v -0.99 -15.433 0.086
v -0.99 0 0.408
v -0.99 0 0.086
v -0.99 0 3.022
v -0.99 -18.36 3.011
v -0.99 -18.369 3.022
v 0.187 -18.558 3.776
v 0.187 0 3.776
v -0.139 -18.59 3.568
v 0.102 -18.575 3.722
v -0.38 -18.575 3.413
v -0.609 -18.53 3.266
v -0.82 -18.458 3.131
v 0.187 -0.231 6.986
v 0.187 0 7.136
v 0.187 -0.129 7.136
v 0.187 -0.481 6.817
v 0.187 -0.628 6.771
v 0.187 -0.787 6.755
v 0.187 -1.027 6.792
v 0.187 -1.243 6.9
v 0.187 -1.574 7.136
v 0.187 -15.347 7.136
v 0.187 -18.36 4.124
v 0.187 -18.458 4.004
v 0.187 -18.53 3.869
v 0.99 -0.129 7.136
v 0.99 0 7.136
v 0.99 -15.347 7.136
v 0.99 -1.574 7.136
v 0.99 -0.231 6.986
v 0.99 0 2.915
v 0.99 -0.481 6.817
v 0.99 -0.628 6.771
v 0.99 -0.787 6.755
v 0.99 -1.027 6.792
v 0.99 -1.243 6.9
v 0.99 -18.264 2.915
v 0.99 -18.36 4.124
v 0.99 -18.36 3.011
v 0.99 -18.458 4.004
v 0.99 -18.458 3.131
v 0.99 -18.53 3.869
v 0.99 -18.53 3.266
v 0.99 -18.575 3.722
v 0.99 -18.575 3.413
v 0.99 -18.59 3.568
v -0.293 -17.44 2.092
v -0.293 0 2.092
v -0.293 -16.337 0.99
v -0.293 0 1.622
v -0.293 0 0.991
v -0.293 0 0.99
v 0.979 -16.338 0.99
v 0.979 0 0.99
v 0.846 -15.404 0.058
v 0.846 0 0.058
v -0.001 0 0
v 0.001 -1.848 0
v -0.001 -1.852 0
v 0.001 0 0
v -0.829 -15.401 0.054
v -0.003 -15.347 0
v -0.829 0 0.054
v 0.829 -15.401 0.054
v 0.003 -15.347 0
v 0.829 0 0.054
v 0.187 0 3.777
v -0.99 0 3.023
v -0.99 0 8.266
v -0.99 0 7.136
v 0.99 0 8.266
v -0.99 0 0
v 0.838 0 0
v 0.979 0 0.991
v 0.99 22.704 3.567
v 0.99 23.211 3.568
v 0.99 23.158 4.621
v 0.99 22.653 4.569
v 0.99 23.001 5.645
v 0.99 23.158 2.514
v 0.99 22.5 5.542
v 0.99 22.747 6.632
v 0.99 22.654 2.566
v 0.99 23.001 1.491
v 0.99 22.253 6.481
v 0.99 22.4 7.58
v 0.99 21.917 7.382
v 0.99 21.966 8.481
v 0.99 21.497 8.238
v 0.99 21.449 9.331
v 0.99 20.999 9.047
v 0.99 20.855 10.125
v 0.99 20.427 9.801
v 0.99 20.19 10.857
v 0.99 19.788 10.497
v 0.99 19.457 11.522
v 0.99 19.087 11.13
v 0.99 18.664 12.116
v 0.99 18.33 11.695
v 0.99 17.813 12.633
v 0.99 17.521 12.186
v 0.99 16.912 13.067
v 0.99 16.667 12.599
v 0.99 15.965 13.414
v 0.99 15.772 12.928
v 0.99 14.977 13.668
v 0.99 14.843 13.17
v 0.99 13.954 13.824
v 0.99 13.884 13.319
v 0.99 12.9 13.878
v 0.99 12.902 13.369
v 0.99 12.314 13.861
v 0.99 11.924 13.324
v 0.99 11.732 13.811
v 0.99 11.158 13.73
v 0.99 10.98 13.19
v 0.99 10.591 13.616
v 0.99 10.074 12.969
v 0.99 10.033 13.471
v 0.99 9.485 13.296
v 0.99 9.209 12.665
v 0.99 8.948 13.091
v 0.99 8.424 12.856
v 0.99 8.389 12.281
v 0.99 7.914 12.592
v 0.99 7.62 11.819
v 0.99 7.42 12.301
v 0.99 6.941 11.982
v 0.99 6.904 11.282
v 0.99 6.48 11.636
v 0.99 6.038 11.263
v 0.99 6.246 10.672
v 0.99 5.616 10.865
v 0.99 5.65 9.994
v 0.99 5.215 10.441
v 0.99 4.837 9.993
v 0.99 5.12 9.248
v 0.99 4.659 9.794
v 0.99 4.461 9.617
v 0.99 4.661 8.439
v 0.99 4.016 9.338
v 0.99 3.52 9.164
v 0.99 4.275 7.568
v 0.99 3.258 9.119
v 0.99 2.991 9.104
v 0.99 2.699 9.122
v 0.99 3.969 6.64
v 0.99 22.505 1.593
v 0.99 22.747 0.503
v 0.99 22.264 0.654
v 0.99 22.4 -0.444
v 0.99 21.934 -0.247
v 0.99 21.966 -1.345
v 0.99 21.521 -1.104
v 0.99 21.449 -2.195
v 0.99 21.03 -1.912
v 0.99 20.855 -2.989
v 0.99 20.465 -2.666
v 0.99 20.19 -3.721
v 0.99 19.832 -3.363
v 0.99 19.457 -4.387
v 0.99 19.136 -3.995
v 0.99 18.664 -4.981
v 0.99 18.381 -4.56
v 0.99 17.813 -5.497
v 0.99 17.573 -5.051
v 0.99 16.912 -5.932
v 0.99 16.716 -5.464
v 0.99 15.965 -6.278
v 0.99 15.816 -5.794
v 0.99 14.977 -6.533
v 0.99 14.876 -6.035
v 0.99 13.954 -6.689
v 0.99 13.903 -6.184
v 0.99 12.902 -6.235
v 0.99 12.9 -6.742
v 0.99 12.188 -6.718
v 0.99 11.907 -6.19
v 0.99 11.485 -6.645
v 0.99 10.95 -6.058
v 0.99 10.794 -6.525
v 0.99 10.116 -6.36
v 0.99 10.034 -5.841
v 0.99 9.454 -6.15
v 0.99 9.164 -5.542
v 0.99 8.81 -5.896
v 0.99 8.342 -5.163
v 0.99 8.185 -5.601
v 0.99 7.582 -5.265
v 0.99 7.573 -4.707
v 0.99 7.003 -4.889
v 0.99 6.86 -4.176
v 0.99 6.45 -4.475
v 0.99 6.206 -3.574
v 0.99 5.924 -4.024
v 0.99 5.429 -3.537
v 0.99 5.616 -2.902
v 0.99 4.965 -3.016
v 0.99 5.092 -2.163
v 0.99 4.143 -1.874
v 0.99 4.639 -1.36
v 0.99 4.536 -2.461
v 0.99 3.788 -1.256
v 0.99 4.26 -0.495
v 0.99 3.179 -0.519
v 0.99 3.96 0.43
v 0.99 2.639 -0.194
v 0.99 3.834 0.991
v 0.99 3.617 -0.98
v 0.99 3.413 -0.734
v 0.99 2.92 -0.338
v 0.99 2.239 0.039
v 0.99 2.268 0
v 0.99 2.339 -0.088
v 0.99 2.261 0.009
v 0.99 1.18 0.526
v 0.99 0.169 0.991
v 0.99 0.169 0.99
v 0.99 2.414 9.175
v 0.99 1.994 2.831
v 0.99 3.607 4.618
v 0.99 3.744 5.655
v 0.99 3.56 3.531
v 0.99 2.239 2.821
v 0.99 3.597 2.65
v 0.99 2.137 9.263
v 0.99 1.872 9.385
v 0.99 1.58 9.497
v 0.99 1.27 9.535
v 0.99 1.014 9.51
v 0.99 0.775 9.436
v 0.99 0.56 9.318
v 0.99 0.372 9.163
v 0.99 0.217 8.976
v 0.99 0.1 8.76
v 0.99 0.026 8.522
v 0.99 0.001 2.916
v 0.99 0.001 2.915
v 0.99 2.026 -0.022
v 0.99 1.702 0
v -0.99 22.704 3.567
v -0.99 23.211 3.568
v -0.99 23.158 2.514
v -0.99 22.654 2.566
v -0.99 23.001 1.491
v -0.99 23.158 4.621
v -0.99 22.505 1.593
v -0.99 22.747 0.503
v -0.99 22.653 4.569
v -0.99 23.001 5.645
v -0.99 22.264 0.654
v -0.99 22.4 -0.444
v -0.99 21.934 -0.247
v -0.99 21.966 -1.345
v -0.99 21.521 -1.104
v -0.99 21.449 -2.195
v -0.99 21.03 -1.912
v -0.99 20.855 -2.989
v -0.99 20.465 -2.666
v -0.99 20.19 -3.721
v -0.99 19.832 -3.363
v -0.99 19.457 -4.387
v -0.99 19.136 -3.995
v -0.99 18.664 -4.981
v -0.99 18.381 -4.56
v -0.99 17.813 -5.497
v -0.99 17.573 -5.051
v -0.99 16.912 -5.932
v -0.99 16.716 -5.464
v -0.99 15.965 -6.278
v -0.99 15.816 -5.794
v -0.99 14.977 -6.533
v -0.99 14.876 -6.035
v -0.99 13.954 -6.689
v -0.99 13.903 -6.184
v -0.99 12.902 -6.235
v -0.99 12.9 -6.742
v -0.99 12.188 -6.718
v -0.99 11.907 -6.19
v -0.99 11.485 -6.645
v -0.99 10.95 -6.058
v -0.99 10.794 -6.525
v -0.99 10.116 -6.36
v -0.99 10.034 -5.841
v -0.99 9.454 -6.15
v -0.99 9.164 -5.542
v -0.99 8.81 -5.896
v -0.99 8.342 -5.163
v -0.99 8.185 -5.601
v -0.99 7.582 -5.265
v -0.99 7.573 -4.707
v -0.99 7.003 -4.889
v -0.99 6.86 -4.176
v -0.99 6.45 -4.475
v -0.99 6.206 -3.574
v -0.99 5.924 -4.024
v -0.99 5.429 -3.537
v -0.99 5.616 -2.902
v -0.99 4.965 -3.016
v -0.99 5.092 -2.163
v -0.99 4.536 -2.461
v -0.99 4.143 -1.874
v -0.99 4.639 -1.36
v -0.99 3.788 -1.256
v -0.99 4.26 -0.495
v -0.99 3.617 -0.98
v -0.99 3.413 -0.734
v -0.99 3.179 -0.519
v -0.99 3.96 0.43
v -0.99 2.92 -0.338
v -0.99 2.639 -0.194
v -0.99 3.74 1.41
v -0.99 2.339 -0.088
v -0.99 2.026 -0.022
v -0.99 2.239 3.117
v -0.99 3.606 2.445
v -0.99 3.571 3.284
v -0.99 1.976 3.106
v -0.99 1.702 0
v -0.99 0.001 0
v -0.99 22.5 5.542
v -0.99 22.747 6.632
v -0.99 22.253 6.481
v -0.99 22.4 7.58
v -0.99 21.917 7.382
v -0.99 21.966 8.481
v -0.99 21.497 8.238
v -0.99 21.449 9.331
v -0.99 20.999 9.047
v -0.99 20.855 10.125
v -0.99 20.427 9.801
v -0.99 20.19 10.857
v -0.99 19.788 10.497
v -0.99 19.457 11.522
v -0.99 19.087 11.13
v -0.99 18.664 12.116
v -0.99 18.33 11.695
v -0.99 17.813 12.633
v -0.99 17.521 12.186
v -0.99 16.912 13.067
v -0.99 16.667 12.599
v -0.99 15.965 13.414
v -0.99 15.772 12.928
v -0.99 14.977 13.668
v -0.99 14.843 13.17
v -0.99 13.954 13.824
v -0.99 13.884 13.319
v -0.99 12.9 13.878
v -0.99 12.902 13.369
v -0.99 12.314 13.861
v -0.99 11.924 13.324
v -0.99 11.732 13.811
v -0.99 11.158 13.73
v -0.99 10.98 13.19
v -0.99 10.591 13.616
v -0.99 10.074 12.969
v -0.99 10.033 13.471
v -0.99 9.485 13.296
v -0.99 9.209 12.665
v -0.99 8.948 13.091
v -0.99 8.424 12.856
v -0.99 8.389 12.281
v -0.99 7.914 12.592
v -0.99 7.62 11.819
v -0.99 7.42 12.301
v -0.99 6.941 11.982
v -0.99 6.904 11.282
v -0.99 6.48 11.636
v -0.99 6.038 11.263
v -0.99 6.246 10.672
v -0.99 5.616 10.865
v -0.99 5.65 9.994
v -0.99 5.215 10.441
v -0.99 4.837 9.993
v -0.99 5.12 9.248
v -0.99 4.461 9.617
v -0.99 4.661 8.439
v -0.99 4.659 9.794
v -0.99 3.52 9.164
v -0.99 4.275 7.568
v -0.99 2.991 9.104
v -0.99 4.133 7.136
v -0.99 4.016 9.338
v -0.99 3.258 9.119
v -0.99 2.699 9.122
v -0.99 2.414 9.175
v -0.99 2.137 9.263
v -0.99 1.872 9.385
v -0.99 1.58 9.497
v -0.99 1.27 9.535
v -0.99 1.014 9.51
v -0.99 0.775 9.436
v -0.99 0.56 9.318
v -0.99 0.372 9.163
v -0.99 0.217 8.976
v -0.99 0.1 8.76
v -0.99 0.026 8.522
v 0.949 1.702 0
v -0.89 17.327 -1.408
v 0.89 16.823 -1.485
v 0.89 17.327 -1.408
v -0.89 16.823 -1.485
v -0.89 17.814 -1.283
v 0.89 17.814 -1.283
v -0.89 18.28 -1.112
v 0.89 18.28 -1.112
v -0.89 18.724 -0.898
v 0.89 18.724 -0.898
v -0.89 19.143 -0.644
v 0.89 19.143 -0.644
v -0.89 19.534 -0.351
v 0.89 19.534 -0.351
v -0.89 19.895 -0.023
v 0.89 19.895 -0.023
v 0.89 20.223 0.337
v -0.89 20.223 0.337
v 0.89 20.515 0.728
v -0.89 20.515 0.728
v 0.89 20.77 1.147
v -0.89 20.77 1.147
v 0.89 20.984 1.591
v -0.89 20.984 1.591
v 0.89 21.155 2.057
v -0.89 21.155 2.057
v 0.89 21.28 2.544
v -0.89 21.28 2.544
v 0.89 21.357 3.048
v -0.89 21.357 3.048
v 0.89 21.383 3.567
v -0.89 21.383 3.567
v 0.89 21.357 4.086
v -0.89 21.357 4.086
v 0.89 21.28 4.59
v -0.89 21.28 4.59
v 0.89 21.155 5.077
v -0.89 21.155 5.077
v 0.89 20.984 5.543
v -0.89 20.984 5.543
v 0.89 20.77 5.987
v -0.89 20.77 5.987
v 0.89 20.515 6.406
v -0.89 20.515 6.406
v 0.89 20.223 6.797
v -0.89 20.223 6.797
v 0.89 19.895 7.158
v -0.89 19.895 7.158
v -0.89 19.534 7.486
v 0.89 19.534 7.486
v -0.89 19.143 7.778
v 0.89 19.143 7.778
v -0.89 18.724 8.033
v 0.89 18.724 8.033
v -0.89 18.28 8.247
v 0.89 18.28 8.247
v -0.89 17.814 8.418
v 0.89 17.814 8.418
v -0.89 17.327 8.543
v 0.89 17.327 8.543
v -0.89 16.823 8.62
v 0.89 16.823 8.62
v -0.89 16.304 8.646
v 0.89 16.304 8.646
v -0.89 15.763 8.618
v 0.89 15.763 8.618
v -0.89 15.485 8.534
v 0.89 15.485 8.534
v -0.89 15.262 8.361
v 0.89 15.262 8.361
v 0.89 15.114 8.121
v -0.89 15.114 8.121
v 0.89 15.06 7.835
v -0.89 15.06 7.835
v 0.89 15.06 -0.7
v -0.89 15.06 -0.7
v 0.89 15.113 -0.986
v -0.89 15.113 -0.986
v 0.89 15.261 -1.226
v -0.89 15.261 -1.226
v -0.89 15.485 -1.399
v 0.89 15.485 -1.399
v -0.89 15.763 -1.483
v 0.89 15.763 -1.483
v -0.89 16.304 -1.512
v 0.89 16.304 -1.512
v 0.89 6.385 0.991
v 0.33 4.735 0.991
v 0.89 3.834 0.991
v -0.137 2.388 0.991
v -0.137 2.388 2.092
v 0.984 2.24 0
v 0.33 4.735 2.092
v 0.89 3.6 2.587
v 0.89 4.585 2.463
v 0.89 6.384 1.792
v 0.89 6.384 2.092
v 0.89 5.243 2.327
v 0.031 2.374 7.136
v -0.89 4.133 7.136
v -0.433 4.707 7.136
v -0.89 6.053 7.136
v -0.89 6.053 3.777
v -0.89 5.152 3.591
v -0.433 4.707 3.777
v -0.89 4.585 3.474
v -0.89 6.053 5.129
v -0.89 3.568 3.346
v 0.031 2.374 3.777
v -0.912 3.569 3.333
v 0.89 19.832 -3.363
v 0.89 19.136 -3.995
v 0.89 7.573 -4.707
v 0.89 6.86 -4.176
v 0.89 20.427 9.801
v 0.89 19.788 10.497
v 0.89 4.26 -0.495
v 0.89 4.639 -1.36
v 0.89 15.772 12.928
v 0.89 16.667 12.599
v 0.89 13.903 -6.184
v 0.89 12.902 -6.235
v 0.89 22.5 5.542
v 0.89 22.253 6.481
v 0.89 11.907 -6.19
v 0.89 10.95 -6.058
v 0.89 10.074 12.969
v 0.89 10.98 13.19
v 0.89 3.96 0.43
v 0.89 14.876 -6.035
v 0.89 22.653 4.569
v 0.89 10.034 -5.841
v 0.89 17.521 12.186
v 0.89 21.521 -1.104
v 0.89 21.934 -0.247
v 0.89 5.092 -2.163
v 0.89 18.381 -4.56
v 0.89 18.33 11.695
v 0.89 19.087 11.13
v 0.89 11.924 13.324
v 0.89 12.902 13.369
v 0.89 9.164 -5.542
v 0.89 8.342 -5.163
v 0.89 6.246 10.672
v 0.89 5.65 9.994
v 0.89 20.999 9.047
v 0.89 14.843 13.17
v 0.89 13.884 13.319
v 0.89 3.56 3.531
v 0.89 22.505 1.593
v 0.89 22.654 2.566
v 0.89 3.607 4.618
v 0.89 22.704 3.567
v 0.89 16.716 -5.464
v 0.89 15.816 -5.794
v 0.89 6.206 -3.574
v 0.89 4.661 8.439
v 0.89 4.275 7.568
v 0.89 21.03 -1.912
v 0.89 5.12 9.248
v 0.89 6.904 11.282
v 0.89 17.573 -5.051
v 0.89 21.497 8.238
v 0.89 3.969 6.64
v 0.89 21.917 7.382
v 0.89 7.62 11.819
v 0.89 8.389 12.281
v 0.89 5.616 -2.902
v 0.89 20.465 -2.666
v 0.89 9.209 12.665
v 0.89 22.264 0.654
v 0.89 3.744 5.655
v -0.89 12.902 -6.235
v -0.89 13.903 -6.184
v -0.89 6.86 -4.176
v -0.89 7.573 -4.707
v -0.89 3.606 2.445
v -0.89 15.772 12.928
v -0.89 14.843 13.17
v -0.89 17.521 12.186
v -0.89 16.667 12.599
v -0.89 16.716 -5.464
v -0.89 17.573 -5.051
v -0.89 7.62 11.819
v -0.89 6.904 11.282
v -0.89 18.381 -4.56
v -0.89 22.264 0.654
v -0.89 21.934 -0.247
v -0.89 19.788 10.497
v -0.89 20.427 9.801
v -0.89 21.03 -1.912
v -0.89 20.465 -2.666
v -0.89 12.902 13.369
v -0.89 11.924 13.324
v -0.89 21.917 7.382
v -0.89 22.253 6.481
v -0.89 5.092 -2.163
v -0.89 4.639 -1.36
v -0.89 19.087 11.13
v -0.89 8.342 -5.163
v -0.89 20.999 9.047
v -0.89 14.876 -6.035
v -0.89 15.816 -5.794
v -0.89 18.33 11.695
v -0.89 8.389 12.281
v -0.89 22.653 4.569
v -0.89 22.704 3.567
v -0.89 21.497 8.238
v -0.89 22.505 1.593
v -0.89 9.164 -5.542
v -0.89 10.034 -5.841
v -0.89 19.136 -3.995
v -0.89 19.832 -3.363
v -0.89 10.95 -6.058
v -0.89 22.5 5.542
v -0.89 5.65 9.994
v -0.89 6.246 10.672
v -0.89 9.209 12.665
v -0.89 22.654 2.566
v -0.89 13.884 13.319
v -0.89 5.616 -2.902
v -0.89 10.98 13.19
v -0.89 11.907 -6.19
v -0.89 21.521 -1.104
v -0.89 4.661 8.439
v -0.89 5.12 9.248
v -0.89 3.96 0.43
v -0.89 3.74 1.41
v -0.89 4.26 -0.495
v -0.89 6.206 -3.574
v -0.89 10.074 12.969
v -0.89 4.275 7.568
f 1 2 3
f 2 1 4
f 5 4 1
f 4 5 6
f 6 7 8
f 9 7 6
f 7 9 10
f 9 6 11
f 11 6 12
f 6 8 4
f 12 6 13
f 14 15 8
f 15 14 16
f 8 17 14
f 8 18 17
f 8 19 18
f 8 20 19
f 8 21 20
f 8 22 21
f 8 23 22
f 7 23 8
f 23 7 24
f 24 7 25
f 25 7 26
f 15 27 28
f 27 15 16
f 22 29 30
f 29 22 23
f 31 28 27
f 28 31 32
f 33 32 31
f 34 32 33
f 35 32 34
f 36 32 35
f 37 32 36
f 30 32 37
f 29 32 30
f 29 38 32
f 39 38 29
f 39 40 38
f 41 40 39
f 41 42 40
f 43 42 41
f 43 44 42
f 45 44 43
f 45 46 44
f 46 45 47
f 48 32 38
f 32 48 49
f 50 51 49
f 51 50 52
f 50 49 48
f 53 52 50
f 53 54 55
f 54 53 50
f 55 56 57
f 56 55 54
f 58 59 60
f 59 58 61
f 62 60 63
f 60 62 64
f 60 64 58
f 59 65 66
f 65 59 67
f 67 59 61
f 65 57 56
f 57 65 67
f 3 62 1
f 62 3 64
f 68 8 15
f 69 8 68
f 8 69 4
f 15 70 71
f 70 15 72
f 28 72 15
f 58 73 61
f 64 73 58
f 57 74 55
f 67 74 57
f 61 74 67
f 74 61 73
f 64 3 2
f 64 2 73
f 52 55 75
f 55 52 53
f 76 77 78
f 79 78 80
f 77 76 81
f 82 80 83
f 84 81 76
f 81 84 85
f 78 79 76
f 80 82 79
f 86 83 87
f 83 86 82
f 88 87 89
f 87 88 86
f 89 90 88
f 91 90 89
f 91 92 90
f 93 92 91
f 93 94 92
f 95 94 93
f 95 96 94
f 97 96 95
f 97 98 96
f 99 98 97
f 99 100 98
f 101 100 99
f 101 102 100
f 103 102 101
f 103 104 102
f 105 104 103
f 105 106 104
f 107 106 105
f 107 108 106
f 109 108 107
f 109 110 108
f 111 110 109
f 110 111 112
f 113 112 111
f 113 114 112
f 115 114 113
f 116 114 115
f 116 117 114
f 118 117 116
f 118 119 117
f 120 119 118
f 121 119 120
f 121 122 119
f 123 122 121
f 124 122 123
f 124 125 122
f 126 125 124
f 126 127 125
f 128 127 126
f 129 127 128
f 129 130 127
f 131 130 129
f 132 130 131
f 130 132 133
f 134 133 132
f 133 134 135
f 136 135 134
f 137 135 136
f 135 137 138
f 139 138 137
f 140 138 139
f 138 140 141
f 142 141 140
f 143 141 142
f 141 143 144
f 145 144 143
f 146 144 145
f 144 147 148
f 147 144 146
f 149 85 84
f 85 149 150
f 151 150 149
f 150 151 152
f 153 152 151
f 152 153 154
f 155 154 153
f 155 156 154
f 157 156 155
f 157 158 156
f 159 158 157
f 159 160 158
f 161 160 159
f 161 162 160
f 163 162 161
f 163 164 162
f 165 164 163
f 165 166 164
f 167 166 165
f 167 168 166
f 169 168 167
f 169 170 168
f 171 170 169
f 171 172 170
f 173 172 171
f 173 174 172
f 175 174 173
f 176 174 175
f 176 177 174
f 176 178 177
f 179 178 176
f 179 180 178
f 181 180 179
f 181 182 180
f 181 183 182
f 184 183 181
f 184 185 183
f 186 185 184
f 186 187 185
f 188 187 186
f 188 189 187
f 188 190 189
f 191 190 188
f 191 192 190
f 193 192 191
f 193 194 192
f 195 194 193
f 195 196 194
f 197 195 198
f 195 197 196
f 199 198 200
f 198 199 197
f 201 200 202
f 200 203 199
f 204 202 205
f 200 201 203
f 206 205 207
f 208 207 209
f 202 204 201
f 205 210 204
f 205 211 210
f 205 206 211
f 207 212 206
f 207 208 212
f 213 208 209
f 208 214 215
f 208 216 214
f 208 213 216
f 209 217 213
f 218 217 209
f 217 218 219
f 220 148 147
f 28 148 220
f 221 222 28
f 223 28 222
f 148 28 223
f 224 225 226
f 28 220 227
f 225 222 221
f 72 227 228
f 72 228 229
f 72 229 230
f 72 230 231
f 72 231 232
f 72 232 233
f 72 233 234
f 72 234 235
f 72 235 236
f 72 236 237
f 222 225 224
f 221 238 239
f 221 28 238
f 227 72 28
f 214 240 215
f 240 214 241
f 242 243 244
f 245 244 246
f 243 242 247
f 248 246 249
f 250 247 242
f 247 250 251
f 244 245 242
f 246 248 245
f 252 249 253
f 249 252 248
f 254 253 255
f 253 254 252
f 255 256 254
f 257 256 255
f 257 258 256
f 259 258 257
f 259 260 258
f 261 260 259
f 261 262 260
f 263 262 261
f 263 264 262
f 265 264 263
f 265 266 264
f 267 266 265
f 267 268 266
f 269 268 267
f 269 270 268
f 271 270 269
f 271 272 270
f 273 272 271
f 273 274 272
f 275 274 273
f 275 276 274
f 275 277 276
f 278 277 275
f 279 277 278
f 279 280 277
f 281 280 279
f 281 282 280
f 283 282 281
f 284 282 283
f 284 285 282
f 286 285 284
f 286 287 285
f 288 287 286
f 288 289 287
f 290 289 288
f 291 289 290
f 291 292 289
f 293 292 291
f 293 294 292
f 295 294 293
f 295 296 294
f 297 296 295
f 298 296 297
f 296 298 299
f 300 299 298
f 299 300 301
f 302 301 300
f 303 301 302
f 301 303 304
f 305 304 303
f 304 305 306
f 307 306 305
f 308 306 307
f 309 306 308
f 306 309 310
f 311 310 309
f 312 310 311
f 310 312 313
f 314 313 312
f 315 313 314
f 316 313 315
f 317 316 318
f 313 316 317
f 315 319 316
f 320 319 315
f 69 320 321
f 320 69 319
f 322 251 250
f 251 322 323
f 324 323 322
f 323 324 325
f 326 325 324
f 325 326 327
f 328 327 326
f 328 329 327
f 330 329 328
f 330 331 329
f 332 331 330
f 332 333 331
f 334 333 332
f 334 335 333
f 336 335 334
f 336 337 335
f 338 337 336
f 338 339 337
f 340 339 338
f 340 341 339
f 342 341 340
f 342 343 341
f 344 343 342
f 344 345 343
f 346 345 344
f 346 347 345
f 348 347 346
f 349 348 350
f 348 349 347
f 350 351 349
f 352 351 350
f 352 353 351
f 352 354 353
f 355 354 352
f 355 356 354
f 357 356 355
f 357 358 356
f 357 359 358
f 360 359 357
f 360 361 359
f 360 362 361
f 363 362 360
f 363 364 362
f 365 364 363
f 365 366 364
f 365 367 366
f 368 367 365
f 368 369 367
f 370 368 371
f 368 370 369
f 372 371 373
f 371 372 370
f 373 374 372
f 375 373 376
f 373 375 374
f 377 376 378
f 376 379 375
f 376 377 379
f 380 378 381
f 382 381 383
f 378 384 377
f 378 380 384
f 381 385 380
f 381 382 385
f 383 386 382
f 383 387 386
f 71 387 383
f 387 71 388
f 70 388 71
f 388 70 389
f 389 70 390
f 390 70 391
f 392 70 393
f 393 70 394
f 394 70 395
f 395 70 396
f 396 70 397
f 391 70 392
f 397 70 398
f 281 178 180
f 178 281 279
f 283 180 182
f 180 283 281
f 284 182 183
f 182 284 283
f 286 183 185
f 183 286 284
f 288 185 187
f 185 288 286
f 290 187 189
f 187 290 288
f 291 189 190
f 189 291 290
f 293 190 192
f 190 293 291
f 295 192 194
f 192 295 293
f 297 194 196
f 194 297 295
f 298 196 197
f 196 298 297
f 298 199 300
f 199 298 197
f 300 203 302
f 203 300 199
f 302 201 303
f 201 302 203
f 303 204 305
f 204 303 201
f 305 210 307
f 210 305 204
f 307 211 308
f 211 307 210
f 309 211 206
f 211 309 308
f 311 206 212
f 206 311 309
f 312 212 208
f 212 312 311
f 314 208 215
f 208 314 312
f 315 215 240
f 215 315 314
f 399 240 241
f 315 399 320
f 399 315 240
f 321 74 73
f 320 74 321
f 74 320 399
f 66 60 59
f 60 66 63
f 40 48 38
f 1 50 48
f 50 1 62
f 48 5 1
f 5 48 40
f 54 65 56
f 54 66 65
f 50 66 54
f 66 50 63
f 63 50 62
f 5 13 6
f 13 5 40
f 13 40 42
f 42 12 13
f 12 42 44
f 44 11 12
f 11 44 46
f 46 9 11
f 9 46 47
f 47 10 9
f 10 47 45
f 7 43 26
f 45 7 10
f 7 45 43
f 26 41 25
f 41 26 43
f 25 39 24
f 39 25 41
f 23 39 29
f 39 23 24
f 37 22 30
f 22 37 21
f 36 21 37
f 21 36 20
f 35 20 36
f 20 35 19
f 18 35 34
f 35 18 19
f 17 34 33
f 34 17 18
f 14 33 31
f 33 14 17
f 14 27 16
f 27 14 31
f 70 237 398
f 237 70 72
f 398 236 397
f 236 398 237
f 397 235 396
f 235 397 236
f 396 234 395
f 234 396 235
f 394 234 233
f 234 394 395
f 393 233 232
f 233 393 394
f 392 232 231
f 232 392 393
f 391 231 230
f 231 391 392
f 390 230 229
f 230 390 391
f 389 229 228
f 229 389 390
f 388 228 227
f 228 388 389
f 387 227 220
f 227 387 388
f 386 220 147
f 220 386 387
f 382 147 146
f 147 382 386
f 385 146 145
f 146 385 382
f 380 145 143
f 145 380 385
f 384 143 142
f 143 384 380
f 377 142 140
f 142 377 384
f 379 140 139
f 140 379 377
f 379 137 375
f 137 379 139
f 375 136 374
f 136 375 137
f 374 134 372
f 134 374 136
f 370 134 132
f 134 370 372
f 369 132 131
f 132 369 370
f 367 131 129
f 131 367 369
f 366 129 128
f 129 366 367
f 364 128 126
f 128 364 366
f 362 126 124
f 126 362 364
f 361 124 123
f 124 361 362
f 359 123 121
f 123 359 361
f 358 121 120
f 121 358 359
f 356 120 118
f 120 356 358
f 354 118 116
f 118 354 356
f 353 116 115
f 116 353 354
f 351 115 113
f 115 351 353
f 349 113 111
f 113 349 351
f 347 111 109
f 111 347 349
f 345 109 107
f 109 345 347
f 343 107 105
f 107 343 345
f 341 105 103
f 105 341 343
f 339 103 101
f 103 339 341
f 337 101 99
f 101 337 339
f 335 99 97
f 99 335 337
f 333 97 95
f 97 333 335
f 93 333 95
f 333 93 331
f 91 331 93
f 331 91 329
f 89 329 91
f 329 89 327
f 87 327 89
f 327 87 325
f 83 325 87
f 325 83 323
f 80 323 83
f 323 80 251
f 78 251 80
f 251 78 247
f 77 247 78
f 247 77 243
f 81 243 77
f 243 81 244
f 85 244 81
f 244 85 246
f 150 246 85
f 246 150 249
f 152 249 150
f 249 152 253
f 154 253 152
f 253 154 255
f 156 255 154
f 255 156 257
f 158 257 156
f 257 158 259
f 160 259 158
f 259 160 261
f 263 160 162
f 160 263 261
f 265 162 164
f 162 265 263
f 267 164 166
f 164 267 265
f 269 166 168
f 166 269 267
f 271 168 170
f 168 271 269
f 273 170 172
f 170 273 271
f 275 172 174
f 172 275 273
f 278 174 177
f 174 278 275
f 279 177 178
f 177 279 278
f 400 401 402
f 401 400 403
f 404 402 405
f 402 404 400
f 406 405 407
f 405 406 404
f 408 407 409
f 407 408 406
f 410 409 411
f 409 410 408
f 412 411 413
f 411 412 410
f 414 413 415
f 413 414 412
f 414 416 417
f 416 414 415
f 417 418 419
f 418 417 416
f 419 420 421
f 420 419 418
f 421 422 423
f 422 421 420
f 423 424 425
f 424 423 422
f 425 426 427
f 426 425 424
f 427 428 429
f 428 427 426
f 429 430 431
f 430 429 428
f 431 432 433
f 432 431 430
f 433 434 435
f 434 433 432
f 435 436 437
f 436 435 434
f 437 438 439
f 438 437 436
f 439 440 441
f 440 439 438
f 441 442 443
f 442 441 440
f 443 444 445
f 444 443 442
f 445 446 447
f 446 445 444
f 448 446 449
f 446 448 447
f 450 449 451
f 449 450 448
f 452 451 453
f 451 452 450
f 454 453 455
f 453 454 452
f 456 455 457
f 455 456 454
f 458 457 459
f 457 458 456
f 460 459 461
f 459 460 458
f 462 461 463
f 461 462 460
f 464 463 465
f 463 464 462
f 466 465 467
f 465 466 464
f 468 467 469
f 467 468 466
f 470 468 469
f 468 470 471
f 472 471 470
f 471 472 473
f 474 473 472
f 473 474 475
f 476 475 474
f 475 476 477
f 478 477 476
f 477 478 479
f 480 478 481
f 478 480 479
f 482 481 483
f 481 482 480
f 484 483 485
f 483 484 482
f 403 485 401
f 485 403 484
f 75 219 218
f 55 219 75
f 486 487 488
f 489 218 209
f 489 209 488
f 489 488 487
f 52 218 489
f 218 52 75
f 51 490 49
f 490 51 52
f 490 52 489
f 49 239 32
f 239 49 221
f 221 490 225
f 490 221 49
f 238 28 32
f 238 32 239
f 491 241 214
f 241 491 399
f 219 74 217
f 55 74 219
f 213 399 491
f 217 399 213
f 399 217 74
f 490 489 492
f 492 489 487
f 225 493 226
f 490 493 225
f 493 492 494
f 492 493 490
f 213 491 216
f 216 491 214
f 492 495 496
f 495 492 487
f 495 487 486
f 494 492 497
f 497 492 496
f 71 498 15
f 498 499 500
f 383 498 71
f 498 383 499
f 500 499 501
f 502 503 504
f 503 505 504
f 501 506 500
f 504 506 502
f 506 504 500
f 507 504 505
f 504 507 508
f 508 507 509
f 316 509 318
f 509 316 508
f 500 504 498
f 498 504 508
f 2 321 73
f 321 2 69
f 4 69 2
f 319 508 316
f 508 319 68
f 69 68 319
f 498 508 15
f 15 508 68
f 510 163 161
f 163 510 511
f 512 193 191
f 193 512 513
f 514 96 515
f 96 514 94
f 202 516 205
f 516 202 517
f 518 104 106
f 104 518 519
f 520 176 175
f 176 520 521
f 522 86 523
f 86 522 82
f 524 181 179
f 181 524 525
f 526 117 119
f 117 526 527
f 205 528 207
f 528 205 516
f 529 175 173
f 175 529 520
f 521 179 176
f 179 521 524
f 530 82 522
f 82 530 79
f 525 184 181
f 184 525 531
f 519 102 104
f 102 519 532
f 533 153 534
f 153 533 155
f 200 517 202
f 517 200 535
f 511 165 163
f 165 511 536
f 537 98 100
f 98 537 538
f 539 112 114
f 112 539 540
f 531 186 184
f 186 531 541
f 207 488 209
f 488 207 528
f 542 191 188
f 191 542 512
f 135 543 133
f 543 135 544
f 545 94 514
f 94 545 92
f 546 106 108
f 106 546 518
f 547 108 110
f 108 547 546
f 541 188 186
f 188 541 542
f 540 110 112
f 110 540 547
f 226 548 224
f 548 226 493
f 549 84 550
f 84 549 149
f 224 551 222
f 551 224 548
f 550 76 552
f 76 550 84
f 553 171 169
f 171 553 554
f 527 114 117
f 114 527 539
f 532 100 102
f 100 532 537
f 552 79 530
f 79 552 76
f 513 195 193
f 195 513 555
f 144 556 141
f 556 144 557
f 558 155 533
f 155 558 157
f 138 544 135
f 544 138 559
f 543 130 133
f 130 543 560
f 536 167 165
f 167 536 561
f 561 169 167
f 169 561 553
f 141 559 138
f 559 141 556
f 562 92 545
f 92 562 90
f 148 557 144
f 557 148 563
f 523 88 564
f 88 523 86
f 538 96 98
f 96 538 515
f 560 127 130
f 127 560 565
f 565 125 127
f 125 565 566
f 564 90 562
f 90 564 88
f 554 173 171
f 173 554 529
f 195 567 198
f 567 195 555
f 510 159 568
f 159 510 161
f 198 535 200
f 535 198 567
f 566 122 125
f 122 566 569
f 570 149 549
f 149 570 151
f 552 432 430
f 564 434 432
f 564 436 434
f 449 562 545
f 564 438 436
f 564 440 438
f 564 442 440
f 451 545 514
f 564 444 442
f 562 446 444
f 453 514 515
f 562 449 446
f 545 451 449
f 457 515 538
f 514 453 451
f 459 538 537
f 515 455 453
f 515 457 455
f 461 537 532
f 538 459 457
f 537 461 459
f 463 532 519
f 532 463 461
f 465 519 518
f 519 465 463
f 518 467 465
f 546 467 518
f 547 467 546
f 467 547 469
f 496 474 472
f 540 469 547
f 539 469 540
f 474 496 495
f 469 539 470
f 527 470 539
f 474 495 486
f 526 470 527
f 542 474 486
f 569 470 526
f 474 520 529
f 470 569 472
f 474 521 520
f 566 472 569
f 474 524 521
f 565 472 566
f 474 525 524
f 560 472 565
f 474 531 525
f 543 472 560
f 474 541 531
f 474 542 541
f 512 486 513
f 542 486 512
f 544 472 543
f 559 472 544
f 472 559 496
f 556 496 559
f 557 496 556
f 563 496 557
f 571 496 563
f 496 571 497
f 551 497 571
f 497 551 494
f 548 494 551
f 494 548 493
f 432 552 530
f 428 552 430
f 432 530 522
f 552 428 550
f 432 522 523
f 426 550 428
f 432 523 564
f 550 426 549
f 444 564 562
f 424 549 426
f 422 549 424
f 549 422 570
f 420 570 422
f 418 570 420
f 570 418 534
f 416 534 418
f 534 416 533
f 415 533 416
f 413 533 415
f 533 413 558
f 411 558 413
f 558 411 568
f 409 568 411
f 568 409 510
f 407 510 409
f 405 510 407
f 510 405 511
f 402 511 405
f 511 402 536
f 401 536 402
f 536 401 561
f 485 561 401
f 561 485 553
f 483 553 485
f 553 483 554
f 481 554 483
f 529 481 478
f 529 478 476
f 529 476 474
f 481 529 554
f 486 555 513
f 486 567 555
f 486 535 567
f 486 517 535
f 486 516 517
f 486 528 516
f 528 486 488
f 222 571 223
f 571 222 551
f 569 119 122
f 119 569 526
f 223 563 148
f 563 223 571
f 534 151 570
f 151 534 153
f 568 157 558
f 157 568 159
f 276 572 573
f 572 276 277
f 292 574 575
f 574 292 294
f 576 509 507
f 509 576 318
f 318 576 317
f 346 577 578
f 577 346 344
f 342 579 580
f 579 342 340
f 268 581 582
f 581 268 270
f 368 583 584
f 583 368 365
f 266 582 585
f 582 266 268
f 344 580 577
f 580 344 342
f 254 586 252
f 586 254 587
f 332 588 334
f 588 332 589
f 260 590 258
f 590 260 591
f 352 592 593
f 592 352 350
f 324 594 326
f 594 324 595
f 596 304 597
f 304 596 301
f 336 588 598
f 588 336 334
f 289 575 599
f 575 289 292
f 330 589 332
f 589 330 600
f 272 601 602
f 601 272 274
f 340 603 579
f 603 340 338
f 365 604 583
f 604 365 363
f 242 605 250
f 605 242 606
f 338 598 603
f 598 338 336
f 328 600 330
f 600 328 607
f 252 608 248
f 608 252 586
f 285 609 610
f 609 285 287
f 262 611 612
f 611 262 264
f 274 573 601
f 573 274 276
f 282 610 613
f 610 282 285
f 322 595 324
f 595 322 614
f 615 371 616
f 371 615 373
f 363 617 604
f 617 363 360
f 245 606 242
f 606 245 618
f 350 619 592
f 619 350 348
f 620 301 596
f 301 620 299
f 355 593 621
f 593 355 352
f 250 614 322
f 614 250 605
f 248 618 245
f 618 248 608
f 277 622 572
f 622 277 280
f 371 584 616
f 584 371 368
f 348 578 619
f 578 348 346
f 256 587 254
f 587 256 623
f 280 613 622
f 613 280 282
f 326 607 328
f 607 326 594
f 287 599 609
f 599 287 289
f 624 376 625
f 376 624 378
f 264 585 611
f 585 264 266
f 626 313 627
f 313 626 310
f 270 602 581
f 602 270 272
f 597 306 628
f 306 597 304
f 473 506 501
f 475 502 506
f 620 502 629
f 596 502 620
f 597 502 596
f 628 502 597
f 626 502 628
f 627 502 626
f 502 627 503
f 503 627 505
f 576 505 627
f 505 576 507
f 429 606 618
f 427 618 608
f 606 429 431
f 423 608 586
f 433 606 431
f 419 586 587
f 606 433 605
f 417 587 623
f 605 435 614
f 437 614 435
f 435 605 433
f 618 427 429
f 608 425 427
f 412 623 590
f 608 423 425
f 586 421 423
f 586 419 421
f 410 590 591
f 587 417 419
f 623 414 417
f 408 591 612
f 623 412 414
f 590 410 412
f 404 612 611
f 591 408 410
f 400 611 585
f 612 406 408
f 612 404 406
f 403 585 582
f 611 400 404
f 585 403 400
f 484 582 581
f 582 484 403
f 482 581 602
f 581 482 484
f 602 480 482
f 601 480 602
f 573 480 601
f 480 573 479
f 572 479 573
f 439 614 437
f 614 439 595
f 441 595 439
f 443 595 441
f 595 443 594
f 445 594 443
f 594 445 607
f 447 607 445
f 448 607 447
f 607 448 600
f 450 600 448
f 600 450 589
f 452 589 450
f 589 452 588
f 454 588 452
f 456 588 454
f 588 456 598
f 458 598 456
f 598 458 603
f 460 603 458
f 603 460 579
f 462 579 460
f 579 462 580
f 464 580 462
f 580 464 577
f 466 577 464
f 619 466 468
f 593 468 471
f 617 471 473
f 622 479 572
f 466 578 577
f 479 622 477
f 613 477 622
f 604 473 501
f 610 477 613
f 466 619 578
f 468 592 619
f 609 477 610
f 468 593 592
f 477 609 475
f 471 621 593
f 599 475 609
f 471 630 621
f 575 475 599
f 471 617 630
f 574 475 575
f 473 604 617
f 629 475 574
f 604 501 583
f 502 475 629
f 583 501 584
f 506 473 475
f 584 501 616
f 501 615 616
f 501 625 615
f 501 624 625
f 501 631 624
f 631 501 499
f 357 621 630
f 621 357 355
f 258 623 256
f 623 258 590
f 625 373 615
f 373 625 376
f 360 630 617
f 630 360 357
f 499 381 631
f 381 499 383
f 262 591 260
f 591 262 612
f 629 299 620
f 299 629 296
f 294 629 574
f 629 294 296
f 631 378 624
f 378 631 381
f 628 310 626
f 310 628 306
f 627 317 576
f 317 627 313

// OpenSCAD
use <keygen.scad>
include <master.gen.scad>

module kwikset(bitting="",
               outline_name="K1",
               warding_name="K1") {

    name = "Master";

    /*
        Bitting is specified from bow to tip, 0-7, with 0 being the shallowest cut and 7 being the deepest.
        Example: 5437
    */

    outlines_k = ["K1"];
    outlines_v = [[outline_k1_points, outline_k1_paths,
                   [-outline_k1_points[61][0], -outline_k1_points[40][1]],
                   engrave_k1_points,
                   engrave_k1_paths]];
    wardings_k = ["K1",
                  "K2",
                  "141"];
    wardings_v = [warding_k1_points,
                  warding_k2_points,
                  warding_141_points];

    outline_param = key_lkup(outlines_k, outlines_v, outline_name);
    outline_points = outline_param[0];
    outline_paths = outline_param[1];
    offset = outline_param[2];
    engrave_points = outline_param[3];
    engrave_paths = outline_param[4];

    warding_points = key_lkup(wardings_k, wardings_v, warding_name);
    
    cut_locations = [for(i=[.187:.125:.563]) i*25.4];
    depth_table = [for(i=[0.2720, 0.2565, 0.2410, 0.2255, 0.2100, 0.1945, 0.1790, 0.1635]) i*25.4];

    heights = key_code_to_heights(bitting, depth_table);

    difference() {
        if($children == 0) {
            key_blank(outline_points,
                      warding_points,
                      outline_paths=outline_paths,
                      engrave_right_points=engrave_points,
                      engrave_right_paths=engrave_paths,
                      engrave_left_points=engrave_points,
                      engrave_left_paths=engrave_paths,
                      offset=offset,
                      plug_diameter=12.7);
        } else {
            children(0);
        }
        key_bitting(heights, cut_locations, 1.27, cutter_height=3);
    }
}

// Defaults
bitting="";
outline="K1";
warding="K1";
kwikset(bitting, outline, warding);
